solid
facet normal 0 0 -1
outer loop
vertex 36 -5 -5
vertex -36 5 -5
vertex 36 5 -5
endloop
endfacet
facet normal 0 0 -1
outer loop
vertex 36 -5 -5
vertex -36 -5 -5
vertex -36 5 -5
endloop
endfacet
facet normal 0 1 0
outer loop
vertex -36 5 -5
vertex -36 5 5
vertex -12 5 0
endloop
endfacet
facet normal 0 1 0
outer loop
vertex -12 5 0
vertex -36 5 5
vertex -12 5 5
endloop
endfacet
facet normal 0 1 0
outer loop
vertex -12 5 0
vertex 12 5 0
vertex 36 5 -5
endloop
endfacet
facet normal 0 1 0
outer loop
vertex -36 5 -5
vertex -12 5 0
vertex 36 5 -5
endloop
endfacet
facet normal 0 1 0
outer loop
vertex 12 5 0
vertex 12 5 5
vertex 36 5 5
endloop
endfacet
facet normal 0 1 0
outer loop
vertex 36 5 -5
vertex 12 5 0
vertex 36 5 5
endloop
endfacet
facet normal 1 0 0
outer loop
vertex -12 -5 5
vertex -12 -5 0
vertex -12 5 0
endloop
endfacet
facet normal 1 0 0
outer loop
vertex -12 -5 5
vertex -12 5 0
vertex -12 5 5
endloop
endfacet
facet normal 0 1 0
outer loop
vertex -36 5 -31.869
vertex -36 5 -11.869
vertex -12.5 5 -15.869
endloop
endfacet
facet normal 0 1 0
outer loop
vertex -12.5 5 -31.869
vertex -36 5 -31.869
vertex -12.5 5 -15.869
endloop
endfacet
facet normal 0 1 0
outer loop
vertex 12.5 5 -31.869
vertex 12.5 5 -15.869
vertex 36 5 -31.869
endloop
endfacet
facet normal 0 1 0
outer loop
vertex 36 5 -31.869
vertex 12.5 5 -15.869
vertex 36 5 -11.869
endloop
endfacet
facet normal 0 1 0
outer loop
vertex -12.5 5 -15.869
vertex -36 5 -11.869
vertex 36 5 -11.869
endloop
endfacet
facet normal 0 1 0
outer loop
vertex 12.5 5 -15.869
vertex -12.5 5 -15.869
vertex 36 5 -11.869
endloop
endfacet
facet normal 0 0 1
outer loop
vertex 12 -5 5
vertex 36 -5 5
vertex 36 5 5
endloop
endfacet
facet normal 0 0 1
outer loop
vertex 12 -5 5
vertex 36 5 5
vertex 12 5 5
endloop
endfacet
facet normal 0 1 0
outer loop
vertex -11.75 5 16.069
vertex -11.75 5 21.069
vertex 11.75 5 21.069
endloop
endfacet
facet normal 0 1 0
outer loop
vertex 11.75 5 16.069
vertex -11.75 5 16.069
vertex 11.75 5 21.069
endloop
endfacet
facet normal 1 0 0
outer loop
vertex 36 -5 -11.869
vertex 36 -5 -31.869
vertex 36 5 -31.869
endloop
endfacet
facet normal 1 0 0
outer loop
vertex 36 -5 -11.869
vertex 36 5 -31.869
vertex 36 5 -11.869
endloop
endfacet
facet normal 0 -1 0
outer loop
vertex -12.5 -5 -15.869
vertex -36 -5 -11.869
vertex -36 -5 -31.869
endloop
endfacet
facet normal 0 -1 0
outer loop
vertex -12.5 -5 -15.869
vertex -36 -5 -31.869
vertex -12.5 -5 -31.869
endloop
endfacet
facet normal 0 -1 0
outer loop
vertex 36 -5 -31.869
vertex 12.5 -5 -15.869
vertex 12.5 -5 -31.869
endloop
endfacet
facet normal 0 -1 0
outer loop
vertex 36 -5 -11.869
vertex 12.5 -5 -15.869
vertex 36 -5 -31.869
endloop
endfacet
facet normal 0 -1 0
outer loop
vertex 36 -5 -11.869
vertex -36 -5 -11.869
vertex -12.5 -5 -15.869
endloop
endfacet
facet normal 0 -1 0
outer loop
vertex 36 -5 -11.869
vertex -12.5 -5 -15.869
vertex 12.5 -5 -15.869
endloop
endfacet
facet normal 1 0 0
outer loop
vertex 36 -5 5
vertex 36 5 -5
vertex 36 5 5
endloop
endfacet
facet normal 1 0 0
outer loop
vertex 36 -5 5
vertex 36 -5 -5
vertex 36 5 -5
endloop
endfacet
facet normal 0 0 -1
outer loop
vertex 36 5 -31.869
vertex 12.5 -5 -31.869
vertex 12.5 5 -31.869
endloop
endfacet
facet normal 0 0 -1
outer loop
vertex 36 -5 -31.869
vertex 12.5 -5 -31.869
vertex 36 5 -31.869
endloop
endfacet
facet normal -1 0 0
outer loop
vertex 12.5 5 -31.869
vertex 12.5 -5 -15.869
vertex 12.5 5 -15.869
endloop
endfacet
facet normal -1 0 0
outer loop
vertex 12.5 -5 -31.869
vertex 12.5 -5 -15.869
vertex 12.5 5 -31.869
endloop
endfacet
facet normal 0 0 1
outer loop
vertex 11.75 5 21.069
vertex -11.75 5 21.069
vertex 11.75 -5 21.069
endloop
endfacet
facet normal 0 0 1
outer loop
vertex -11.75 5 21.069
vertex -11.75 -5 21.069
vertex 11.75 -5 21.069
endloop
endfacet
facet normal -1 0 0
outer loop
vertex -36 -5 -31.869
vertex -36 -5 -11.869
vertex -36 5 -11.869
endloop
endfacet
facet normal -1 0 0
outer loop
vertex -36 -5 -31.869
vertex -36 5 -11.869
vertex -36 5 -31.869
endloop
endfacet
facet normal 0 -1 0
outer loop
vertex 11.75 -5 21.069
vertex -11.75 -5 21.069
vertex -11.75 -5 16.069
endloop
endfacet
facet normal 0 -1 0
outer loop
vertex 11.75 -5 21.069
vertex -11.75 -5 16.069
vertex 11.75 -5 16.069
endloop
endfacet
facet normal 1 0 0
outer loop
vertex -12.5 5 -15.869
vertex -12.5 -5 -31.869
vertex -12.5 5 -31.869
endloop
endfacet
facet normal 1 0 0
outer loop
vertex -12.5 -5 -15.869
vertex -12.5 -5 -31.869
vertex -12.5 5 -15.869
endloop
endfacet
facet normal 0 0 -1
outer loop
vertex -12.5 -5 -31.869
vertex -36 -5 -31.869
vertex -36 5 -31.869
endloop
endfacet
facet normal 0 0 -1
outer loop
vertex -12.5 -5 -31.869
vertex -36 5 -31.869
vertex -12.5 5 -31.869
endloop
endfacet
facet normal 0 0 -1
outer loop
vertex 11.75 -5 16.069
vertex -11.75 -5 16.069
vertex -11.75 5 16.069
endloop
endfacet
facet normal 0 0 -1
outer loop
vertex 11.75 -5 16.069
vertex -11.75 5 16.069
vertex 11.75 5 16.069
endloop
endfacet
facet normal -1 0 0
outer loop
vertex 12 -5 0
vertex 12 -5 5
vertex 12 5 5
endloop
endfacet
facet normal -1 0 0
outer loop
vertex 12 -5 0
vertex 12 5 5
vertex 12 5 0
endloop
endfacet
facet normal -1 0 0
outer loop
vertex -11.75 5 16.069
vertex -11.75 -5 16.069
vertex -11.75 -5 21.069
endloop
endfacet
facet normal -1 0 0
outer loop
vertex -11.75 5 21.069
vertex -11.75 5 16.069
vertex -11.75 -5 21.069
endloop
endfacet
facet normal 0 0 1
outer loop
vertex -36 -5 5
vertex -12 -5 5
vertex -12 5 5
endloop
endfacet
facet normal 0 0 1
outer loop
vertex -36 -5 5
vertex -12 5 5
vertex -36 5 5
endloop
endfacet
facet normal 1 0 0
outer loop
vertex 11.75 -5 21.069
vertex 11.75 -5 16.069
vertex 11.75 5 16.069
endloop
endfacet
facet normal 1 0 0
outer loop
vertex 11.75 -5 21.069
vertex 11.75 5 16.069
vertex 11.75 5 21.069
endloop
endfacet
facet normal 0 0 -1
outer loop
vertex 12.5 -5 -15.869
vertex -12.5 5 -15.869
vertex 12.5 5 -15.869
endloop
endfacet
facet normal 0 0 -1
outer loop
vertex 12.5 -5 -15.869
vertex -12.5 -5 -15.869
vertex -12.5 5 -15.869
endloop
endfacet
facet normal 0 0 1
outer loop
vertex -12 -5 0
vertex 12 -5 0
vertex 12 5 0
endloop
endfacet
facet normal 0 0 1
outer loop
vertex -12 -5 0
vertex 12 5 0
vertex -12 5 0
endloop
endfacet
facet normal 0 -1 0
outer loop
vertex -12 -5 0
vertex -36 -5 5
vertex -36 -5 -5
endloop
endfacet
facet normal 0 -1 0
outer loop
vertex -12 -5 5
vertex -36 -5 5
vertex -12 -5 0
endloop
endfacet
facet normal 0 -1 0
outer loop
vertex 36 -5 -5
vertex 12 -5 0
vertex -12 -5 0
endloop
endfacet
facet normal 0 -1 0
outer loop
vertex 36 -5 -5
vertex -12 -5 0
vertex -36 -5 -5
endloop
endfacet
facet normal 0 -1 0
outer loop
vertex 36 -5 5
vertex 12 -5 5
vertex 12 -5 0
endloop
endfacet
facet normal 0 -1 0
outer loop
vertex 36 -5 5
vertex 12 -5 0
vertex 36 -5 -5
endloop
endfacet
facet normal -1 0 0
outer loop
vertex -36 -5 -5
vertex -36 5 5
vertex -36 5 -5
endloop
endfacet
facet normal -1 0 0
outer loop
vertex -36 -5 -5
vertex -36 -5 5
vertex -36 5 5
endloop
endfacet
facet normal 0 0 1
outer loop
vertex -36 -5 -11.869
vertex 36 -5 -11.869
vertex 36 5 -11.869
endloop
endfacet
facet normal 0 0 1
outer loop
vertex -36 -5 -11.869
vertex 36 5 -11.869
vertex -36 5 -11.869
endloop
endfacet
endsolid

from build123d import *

# Parameters (mm, degrees)
F1_DEPTH = 5
F2_W     = 23.5
F2_H     = 5
F3_DEPTH = 5
F5_DEPTH = 5


with BuildPart() as f1:
    # F0 (on Front) → F1 (new body, symmetric)
    with BuildSketch(Plane.XZ):
        Polygon((36, -5), (36, 5), (12, 5), (12, 0), (-12, 0), (-12, 5), (-36, 5), (-36, -5), align=None)
    extrude(amount=F1_DEPTH, both=True)


with BuildPart() as f3:
    # F2 (on Front) → F3 (new body, symmetric)
    with BuildSketch(Plane.XZ):
        with Locations((0, 18.569236)):
            Rectangle(F2_W, F2_H)
    extrude(amount=F3_DEPTH, both=True)


with BuildPart() as f5:
    # F4 (on Front) → F5 (new body, symmetric)
    with BuildSketch(Plane.XZ):
        Polygon((12.5, -31.868731), (36, -31.868731), (36, -11.868731), (-36, -11.868731), (-36, -31.868731), (-12.5, -31.868731), (-12.5, -15.868731), (12.5, -15.868731), align=None)
    extrude(amount=F5_DEPTH, both=True)


solid = Compound([f1.part, f3.part, f5.part])
